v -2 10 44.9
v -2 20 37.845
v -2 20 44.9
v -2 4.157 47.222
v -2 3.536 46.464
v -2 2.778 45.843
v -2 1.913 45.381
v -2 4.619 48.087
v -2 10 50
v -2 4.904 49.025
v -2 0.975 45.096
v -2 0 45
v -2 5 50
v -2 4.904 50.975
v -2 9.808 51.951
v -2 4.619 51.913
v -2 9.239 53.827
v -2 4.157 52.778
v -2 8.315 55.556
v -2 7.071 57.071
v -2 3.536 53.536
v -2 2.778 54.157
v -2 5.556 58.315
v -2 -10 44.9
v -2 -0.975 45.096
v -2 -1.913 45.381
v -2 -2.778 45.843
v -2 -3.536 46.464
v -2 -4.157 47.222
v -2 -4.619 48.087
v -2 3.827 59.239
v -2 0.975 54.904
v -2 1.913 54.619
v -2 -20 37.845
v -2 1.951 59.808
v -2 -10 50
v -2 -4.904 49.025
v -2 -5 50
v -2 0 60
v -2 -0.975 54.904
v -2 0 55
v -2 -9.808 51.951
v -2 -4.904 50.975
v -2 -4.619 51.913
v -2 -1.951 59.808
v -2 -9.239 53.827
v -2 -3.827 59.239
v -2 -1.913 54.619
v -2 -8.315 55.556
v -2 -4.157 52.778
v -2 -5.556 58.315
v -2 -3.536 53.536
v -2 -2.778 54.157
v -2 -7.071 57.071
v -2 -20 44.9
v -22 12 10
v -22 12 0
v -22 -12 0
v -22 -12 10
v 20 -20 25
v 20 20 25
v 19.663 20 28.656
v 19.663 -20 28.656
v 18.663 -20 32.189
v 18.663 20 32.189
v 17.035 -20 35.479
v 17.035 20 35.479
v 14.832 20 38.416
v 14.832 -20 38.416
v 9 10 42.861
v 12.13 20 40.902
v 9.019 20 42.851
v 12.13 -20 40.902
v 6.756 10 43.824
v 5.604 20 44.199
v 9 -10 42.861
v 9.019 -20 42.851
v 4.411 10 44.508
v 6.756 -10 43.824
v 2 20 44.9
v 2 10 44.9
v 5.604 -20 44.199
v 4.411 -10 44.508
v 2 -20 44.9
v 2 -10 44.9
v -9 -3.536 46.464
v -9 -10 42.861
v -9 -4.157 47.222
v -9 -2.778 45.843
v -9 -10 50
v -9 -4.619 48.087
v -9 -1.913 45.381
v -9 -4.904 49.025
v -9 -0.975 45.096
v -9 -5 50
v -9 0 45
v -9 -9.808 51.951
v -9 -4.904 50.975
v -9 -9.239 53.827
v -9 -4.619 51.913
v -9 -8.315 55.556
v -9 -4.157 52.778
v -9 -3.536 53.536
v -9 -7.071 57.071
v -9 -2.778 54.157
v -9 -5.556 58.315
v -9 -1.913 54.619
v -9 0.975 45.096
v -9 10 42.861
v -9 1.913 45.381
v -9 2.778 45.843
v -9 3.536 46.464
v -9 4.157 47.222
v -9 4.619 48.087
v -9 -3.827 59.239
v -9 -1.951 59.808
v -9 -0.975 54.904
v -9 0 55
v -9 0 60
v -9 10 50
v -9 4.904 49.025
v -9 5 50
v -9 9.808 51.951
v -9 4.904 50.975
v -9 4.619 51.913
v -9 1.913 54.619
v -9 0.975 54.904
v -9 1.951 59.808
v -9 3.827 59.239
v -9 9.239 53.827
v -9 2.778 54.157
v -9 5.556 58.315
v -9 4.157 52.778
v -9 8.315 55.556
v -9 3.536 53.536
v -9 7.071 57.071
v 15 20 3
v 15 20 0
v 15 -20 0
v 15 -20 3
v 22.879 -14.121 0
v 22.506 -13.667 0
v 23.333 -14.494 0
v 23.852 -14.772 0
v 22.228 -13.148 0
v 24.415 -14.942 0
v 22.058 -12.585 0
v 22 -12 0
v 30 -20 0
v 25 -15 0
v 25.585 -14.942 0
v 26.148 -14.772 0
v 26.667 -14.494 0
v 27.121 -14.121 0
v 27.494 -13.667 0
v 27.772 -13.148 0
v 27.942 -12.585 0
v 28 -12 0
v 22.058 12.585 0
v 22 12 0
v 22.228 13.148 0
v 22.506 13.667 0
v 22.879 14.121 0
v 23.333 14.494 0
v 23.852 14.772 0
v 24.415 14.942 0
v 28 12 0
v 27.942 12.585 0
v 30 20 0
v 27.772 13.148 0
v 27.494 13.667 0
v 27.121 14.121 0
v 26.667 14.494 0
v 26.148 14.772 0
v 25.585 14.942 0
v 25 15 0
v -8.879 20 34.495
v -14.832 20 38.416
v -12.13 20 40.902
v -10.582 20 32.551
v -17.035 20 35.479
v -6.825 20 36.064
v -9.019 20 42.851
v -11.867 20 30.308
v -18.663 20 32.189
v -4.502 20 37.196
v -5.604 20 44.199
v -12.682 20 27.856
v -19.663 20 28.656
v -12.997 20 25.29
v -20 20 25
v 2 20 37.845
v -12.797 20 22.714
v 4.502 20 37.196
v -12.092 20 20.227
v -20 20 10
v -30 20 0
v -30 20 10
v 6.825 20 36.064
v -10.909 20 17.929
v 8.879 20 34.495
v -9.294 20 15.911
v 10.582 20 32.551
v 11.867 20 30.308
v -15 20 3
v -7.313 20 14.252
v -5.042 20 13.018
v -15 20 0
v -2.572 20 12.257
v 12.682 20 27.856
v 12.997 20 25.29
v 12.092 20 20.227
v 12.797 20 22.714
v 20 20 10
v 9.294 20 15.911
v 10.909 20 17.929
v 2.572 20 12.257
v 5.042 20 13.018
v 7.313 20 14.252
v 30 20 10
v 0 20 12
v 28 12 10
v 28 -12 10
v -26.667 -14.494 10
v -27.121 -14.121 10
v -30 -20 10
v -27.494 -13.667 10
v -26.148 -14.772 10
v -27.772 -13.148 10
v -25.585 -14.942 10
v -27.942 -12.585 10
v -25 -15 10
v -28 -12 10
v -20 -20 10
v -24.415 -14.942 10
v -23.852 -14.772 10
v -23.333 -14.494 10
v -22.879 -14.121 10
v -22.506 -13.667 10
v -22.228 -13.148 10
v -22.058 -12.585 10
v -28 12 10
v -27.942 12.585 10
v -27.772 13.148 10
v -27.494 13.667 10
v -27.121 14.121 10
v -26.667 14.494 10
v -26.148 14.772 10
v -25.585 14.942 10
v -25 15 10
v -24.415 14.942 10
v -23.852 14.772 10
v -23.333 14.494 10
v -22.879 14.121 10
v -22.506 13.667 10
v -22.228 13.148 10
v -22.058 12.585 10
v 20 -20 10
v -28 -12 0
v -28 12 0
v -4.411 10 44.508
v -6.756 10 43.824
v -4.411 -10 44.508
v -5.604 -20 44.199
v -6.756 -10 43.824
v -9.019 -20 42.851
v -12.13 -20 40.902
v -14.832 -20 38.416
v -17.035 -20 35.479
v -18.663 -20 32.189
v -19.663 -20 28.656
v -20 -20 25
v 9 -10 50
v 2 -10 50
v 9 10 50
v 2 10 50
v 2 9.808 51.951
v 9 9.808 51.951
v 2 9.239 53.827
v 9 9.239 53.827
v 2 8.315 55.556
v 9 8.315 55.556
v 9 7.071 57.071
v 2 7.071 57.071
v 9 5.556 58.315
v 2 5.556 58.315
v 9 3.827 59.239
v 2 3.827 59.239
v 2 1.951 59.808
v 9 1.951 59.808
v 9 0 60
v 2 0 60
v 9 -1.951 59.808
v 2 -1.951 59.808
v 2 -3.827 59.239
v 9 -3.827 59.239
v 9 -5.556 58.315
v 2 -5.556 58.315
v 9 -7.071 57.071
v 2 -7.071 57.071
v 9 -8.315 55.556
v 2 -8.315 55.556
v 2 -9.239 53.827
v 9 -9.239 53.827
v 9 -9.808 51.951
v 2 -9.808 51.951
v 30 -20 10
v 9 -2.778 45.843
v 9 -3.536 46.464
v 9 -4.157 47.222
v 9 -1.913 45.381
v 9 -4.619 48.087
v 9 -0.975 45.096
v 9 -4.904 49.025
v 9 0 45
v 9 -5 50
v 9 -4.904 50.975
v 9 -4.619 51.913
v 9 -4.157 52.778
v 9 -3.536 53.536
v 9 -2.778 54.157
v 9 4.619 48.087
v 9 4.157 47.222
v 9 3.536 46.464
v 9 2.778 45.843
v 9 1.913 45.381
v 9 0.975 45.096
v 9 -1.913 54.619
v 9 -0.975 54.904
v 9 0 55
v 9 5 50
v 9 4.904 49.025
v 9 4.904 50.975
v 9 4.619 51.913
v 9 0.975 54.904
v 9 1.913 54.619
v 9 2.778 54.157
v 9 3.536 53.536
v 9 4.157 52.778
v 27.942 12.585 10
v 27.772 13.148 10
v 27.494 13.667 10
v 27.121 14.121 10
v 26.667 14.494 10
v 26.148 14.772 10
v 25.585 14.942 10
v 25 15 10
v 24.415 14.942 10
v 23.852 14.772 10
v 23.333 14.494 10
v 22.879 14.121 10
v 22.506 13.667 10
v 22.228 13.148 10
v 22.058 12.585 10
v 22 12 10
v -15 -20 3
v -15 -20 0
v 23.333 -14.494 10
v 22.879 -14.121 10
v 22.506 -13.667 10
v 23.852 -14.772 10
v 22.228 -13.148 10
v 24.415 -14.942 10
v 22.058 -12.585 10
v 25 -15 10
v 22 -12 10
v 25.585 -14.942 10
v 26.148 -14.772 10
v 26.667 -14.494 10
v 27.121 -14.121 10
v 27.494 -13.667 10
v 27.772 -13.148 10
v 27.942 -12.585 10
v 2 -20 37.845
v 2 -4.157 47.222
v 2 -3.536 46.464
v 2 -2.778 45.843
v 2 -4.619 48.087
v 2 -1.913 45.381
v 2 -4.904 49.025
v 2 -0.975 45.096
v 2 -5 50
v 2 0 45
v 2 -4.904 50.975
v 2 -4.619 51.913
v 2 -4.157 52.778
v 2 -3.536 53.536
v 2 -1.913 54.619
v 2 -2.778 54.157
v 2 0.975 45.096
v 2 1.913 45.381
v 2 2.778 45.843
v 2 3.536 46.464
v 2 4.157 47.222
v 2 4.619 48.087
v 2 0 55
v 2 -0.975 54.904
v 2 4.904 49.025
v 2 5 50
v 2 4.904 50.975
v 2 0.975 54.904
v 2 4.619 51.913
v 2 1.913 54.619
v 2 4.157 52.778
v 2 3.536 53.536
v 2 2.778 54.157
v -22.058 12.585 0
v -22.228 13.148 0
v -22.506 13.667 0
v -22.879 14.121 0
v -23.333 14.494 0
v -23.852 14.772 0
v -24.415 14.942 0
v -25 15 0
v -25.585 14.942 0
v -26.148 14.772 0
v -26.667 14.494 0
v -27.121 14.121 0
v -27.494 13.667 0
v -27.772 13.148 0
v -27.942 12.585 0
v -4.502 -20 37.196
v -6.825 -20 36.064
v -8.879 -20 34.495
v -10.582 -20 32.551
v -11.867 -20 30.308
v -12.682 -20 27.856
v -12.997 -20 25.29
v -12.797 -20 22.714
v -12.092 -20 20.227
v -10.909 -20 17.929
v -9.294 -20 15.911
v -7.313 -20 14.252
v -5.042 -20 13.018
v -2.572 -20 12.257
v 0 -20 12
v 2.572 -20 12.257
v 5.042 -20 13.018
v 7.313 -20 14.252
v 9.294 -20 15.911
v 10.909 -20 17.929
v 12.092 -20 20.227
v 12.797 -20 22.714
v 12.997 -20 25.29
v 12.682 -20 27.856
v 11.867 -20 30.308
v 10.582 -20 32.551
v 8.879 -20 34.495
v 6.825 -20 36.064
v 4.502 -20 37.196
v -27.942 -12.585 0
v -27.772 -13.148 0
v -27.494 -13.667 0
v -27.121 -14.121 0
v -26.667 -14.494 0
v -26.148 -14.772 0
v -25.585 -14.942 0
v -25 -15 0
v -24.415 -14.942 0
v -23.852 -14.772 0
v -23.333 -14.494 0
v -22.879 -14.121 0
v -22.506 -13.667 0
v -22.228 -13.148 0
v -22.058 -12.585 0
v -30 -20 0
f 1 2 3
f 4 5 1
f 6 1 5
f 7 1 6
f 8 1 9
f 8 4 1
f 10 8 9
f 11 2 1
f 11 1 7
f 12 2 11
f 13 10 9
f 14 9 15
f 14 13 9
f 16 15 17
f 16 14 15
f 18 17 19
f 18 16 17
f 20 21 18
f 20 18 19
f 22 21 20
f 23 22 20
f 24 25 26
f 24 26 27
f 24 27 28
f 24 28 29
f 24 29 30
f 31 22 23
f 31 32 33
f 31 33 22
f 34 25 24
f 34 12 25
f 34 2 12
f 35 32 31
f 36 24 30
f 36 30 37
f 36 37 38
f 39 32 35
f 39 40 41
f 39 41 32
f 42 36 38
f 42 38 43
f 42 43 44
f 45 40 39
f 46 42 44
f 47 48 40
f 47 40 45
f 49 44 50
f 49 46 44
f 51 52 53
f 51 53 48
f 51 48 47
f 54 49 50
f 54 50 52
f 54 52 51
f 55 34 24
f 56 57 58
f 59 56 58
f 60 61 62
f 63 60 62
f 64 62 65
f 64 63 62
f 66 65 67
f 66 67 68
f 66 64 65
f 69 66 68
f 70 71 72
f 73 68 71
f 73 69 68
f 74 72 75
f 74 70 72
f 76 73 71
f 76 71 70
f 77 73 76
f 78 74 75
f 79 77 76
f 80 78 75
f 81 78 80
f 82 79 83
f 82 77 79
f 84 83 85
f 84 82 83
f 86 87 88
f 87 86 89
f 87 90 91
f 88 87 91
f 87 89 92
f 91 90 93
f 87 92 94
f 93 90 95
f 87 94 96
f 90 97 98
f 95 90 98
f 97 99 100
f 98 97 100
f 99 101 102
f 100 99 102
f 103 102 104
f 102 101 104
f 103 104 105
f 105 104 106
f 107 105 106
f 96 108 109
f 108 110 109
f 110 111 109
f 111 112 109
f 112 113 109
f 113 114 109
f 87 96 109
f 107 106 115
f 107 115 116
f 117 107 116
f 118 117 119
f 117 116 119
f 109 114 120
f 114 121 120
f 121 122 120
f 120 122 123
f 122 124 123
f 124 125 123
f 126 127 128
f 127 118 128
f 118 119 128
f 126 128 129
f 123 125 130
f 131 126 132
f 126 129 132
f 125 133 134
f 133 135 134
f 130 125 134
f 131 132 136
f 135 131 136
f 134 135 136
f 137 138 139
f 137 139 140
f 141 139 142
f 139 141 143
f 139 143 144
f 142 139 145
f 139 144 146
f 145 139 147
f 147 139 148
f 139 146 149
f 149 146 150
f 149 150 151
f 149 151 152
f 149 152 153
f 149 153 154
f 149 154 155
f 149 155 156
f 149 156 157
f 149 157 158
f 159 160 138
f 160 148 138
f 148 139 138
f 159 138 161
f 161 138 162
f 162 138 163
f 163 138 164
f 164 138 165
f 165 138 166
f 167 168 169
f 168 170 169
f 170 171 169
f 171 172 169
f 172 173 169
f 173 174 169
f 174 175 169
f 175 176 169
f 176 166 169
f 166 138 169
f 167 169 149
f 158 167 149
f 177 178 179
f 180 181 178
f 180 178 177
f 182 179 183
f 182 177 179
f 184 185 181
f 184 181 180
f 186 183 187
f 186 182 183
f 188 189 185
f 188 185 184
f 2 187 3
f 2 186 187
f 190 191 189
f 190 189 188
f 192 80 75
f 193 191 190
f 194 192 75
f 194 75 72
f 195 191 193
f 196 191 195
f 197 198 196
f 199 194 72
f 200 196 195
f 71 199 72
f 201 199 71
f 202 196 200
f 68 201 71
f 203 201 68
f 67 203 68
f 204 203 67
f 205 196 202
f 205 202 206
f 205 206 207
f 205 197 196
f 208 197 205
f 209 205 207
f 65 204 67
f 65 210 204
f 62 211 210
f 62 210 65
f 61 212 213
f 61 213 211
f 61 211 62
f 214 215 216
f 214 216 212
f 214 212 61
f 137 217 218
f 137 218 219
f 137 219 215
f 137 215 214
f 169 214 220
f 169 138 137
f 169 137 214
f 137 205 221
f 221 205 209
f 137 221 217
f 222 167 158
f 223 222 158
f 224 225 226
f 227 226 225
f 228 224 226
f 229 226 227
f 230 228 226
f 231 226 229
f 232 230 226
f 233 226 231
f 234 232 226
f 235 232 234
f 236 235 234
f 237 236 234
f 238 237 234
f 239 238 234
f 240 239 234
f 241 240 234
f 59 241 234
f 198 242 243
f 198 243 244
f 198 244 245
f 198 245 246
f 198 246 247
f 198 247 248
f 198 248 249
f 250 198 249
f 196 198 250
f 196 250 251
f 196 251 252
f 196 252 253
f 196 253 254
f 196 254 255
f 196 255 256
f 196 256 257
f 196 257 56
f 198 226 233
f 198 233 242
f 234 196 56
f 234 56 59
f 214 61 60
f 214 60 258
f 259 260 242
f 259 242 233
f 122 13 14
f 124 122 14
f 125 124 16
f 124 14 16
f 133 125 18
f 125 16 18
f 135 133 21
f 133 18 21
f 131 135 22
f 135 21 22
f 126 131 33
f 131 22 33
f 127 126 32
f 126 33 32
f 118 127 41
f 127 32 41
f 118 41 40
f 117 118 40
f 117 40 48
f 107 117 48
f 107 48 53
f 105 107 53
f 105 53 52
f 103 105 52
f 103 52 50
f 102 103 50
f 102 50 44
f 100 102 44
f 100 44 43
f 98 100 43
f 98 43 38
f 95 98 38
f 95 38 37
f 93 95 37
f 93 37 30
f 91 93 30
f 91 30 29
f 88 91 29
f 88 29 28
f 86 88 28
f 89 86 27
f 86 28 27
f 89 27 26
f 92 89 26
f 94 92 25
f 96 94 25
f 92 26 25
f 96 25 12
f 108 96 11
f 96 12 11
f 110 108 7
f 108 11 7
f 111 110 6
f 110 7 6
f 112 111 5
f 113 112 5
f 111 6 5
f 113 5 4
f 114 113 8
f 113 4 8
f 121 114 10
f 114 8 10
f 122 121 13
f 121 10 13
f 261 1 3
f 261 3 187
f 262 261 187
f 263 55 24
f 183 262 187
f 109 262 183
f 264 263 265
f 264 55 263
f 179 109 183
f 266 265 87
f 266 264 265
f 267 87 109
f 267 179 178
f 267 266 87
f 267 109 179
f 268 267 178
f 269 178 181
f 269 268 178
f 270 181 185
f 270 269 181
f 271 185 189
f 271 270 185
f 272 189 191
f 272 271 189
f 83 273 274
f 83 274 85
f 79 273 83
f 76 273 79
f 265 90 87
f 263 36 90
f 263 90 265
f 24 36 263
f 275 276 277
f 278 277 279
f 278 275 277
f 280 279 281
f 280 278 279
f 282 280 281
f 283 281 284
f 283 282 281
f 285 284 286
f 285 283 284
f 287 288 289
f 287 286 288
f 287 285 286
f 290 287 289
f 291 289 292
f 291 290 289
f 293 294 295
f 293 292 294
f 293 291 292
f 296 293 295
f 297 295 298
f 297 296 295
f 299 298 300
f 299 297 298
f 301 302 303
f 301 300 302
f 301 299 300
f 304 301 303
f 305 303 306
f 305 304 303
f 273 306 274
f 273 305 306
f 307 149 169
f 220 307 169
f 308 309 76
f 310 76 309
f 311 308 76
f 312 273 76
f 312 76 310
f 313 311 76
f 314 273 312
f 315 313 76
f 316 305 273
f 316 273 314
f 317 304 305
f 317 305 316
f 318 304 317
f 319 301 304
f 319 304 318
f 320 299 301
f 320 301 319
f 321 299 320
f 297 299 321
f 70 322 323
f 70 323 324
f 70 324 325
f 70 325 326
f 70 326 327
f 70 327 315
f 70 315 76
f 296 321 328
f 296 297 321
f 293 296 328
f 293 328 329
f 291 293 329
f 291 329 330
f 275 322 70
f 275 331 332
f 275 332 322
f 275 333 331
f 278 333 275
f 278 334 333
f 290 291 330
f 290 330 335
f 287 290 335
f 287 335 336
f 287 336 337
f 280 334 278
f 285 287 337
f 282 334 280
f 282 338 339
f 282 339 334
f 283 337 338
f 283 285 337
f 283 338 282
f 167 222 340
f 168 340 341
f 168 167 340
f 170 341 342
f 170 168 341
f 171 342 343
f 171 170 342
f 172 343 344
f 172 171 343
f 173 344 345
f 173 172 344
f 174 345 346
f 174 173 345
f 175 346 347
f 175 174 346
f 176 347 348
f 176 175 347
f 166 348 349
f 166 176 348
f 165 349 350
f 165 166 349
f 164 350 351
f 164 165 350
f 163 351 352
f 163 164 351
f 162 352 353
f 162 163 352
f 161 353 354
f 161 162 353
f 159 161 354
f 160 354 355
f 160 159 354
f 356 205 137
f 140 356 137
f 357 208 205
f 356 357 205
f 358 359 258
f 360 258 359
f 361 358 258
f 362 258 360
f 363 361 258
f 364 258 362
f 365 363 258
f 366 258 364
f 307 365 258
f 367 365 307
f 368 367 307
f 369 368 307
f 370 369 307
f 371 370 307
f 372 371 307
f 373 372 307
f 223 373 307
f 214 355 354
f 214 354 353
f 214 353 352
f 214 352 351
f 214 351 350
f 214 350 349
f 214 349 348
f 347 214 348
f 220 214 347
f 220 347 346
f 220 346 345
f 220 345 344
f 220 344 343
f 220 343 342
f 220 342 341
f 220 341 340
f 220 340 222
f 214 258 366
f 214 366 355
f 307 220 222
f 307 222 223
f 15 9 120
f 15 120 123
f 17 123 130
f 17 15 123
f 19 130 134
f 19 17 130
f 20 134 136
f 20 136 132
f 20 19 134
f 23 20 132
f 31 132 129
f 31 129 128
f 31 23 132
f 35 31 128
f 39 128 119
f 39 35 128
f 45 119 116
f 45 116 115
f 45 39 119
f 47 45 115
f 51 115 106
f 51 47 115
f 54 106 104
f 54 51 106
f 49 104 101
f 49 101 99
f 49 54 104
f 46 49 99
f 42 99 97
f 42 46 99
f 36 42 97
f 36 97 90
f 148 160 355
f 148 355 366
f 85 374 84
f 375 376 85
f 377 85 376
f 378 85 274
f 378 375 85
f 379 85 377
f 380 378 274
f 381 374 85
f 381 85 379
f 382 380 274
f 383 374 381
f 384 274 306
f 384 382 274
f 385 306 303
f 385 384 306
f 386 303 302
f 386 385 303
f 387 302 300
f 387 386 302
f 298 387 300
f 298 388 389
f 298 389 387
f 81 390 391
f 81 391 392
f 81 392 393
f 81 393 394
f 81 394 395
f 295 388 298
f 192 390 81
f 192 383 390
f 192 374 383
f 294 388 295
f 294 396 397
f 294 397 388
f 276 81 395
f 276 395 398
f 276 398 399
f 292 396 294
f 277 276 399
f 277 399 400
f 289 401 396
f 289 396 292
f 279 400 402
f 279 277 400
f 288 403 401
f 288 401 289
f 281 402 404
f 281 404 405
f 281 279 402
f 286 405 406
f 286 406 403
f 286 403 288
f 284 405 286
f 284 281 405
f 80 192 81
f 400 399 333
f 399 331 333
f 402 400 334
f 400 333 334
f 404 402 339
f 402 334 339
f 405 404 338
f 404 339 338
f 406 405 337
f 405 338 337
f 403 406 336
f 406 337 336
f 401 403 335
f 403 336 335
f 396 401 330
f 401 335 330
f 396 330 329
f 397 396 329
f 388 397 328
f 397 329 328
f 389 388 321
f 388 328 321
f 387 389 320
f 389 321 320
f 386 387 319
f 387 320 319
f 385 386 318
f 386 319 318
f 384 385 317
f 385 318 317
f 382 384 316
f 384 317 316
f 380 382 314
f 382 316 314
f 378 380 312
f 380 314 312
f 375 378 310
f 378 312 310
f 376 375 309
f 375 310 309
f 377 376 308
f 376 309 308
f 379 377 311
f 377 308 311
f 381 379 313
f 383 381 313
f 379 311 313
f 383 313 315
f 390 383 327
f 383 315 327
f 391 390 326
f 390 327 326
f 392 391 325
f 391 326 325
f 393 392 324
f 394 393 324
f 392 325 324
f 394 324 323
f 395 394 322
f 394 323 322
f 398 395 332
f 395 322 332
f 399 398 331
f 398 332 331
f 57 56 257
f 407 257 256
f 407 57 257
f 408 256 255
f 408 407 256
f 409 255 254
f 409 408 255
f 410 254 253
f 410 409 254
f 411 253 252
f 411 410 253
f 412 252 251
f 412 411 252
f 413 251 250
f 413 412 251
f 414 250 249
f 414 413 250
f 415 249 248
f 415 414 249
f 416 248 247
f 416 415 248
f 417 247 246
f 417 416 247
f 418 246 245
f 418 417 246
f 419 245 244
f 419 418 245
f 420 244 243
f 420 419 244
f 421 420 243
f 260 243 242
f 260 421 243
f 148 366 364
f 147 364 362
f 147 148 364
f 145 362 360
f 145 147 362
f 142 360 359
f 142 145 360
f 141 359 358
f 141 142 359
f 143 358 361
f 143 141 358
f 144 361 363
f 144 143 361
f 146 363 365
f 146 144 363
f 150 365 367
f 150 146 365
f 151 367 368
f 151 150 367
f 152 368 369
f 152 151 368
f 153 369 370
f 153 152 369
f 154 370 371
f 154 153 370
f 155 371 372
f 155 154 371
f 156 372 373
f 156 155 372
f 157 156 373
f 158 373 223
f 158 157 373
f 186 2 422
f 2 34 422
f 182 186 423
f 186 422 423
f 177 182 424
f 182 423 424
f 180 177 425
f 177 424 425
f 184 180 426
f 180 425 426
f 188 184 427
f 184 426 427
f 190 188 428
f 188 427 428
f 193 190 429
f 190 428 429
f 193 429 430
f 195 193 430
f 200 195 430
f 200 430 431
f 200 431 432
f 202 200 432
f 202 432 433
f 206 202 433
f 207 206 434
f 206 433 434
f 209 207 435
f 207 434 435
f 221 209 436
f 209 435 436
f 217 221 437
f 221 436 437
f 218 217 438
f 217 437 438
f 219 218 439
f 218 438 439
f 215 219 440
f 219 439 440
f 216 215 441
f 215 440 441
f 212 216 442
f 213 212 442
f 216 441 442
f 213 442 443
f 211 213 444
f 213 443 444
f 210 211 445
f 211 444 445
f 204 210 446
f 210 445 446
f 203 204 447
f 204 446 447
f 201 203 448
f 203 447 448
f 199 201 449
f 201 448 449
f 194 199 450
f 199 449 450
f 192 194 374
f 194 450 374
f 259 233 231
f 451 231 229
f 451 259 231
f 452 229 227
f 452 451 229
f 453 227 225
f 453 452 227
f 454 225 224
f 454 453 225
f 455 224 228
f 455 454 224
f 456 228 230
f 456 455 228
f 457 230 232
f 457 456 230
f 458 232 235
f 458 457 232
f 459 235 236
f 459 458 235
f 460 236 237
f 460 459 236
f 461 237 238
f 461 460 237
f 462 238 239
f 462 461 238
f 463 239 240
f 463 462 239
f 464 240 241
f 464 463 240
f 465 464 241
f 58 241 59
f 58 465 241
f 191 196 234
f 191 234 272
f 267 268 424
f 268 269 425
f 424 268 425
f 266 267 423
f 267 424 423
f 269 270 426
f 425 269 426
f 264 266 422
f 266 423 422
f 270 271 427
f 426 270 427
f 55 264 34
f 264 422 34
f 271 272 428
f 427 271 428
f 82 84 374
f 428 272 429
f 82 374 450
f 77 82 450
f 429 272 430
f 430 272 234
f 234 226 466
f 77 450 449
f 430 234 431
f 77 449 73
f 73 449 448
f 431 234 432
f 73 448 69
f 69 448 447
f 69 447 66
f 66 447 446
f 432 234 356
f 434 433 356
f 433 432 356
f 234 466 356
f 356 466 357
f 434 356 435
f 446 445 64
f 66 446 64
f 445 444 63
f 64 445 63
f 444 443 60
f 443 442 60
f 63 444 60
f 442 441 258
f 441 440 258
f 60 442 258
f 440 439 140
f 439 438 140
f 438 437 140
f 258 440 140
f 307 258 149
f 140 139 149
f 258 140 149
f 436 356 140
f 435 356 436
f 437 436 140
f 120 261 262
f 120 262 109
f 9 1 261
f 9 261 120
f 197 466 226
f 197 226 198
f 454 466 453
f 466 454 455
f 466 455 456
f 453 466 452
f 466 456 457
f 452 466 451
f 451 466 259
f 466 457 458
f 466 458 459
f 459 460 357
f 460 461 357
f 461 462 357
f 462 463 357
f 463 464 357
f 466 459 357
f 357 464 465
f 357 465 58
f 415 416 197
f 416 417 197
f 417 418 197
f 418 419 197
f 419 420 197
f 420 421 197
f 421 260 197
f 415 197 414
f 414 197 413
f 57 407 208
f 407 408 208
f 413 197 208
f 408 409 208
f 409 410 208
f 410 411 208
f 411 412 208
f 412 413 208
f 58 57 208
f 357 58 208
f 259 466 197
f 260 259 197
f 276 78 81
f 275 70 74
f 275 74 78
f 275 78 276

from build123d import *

# Parameters (mm, degrees)
SKETCH_W             = 60
SKETCH_H             = 40
PAD_DEPTH            = 10
PAD001_DEPTH         = 40
PAD002_DEPTH         = 9
PAD002_DEPTH_BACK    = 9
SKETCH003_R          = 5
POCKET_DEPTH         = 10
POCKET_DEPTH_BACK    = -10
SKETCH004_R          = 13
POCKET001_DEPTH      = 20
POCKET001_DEPTH_BACK = -20
SKETCH005_W          = 4
SKETCH005_H          = 29.604214
POCKET002_DEPTH      = 20
POCKET002_DEPTH_BACK = -20
SKETCH006_W          = 30
SKETCH006_H          = 3
POCKET003_DEPTH      = 55
POCKET003_DEPTH_BACK = -150
POCKET004_DEPTH      = 5
POCKET004_DEPTH_BACK = -100
POCKET005_DEPTH      = 5
POCKET005_DEPTH_BACK = -100


with BuildPart() as part:
    # Sketch → Pad (new body)
    with BuildSketch(Plane.XY):
        Rectangle(SKETCH_W, SKETCH_H)
    extrude(amount=PAD_DEPTH)

    # Sketch001 (on Face3 of Pad) → Pad001 (join)
    with BuildSketch(Plane.XZ.offset(20)):
        with BuildLine():
            Line((-20, 10), (-20, 25))
            ThreePointArc((20, 25), (0, 45), (-20, 25))
            Line((20, 25), (20, 10))
            Line((20, 10), (-20, 10))
        make_face()
    extrude(amount=-PAD001_DEPTH)

    # Sketch002 → Pad002 (join, two sides)
    with BuildSketch(Plane.YZ) as pad002_sk:
        with BuildLine():
            Line((10, 42.768332), (10, 50))
            ThreePointArc((10, 50), (0, 60), (-10, 50))
            Line((-10, 50), (-10, 42.768332))
            Line((10, 42.768332), (-10, 42.768332))
        make_face()
    extrude(amount=PAD002_DEPTH)
    extrude(pad002_sk.sketch, amount=-PAD002_DEPTH_BACK)

    # Sketch003 → Pocket (cut, two sides)
    with BuildSketch(Plane.YZ) as pocket_sk:
        with Locations((0, 50)):
            Circle(SKETCH003_R)
    extrude(amount=-POCKET_DEPTH, mode=Mode.SUBTRACT)
    extrude(pocket_sk.sketch, amount=-POCKET_DEPTH_BACK, mode=Mode.SUBTRACT)

    # Sketch004 → Pocket001 (cut, two sides)
    with BuildSketch(Plane.XZ) as pocket001_sk:
        with Locations((0, 25)):
            Circle(SKETCH004_R)
    extrude(amount=-POCKET001_DEPTH, mode=Mode.SUBTRACT)
    extrude(pocket001_sk.sketch, amount=-POCKET001_DEPTH_BACK, mode=Mode.SUBTRACT)

    # Sketch005 → Pocket002 (cut, two sides)
    with BuildSketch(Plane.XZ) as pocket002_sk:
        with Locations((0, 49.345087)):
            Rectangle(SKETCH005_W, SKETCH005_H)
    extrude(amount=-POCKET002_DEPTH, mode=Mode.SUBTRACT)
    extrude(pocket002_sk.sketch, amount=-POCKET002_DEPTH_BACK, mode=Mode.SUBTRACT)

    # Sketch006 → Pocket003 (cut, two sides)
    with BuildSketch(Plane.XZ) as pocket003_sk:
        with Locations((0, 1.5)):
            Rectangle(SKETCH006_W, SKETCH006_H)
    extrude(amount=-POCKET003_DEPTH, mode=Mode.SUBTRACT)
    extrude(pocket003_sk.sketch, amount=-POCKET003_DEPTH_BACK, mode=Mode.SUBTRACT)

    # Sketch007 → Pocket004 (cut, two sides)
    with BuildSketch(Plane.XY) as pocket004_sk:
        with BuildLine():
            ThreePointArc((-22, 12), (-25, 15), (-28, 12))
            Line((-28, 12), (-28, -12))
            ThreePointArc((-28, -12), (-25, -15), (-22, -12))
            Line((-22, 12), (-22, -12))
        make_face()
    extrude(amount=-POCKET004_DEPTH, mode=Mode.SUBTRACT)
    extrude(pocket004_sk.sketch, amount=-POCKET004_DEPTH_BACK, mode=Mode.SUBTRACT)

    # Sketch008 → Pocket005 (cut, two sides)
    with BuildSketch(Plane.XY) as pocket005_sk:
        with BuildLine():
            ThreePointArc((28, 12), (25, 15), (22, 12))
            Line((22, 12), (22, -12))
            ThreePointArc((22, -12), (25, -15), (28, -12))
            Line((28, 12), (28, -12))
        make_face()
    extrude(amount=-POCKET005_DEPTH, mode=Mode.SUBTRACT)
    extrude(pocket005_sk.sketch, amount=-POCKET005_DEPTH_BACK, mode=Mode.SUBTRACT)


solid = part.part
